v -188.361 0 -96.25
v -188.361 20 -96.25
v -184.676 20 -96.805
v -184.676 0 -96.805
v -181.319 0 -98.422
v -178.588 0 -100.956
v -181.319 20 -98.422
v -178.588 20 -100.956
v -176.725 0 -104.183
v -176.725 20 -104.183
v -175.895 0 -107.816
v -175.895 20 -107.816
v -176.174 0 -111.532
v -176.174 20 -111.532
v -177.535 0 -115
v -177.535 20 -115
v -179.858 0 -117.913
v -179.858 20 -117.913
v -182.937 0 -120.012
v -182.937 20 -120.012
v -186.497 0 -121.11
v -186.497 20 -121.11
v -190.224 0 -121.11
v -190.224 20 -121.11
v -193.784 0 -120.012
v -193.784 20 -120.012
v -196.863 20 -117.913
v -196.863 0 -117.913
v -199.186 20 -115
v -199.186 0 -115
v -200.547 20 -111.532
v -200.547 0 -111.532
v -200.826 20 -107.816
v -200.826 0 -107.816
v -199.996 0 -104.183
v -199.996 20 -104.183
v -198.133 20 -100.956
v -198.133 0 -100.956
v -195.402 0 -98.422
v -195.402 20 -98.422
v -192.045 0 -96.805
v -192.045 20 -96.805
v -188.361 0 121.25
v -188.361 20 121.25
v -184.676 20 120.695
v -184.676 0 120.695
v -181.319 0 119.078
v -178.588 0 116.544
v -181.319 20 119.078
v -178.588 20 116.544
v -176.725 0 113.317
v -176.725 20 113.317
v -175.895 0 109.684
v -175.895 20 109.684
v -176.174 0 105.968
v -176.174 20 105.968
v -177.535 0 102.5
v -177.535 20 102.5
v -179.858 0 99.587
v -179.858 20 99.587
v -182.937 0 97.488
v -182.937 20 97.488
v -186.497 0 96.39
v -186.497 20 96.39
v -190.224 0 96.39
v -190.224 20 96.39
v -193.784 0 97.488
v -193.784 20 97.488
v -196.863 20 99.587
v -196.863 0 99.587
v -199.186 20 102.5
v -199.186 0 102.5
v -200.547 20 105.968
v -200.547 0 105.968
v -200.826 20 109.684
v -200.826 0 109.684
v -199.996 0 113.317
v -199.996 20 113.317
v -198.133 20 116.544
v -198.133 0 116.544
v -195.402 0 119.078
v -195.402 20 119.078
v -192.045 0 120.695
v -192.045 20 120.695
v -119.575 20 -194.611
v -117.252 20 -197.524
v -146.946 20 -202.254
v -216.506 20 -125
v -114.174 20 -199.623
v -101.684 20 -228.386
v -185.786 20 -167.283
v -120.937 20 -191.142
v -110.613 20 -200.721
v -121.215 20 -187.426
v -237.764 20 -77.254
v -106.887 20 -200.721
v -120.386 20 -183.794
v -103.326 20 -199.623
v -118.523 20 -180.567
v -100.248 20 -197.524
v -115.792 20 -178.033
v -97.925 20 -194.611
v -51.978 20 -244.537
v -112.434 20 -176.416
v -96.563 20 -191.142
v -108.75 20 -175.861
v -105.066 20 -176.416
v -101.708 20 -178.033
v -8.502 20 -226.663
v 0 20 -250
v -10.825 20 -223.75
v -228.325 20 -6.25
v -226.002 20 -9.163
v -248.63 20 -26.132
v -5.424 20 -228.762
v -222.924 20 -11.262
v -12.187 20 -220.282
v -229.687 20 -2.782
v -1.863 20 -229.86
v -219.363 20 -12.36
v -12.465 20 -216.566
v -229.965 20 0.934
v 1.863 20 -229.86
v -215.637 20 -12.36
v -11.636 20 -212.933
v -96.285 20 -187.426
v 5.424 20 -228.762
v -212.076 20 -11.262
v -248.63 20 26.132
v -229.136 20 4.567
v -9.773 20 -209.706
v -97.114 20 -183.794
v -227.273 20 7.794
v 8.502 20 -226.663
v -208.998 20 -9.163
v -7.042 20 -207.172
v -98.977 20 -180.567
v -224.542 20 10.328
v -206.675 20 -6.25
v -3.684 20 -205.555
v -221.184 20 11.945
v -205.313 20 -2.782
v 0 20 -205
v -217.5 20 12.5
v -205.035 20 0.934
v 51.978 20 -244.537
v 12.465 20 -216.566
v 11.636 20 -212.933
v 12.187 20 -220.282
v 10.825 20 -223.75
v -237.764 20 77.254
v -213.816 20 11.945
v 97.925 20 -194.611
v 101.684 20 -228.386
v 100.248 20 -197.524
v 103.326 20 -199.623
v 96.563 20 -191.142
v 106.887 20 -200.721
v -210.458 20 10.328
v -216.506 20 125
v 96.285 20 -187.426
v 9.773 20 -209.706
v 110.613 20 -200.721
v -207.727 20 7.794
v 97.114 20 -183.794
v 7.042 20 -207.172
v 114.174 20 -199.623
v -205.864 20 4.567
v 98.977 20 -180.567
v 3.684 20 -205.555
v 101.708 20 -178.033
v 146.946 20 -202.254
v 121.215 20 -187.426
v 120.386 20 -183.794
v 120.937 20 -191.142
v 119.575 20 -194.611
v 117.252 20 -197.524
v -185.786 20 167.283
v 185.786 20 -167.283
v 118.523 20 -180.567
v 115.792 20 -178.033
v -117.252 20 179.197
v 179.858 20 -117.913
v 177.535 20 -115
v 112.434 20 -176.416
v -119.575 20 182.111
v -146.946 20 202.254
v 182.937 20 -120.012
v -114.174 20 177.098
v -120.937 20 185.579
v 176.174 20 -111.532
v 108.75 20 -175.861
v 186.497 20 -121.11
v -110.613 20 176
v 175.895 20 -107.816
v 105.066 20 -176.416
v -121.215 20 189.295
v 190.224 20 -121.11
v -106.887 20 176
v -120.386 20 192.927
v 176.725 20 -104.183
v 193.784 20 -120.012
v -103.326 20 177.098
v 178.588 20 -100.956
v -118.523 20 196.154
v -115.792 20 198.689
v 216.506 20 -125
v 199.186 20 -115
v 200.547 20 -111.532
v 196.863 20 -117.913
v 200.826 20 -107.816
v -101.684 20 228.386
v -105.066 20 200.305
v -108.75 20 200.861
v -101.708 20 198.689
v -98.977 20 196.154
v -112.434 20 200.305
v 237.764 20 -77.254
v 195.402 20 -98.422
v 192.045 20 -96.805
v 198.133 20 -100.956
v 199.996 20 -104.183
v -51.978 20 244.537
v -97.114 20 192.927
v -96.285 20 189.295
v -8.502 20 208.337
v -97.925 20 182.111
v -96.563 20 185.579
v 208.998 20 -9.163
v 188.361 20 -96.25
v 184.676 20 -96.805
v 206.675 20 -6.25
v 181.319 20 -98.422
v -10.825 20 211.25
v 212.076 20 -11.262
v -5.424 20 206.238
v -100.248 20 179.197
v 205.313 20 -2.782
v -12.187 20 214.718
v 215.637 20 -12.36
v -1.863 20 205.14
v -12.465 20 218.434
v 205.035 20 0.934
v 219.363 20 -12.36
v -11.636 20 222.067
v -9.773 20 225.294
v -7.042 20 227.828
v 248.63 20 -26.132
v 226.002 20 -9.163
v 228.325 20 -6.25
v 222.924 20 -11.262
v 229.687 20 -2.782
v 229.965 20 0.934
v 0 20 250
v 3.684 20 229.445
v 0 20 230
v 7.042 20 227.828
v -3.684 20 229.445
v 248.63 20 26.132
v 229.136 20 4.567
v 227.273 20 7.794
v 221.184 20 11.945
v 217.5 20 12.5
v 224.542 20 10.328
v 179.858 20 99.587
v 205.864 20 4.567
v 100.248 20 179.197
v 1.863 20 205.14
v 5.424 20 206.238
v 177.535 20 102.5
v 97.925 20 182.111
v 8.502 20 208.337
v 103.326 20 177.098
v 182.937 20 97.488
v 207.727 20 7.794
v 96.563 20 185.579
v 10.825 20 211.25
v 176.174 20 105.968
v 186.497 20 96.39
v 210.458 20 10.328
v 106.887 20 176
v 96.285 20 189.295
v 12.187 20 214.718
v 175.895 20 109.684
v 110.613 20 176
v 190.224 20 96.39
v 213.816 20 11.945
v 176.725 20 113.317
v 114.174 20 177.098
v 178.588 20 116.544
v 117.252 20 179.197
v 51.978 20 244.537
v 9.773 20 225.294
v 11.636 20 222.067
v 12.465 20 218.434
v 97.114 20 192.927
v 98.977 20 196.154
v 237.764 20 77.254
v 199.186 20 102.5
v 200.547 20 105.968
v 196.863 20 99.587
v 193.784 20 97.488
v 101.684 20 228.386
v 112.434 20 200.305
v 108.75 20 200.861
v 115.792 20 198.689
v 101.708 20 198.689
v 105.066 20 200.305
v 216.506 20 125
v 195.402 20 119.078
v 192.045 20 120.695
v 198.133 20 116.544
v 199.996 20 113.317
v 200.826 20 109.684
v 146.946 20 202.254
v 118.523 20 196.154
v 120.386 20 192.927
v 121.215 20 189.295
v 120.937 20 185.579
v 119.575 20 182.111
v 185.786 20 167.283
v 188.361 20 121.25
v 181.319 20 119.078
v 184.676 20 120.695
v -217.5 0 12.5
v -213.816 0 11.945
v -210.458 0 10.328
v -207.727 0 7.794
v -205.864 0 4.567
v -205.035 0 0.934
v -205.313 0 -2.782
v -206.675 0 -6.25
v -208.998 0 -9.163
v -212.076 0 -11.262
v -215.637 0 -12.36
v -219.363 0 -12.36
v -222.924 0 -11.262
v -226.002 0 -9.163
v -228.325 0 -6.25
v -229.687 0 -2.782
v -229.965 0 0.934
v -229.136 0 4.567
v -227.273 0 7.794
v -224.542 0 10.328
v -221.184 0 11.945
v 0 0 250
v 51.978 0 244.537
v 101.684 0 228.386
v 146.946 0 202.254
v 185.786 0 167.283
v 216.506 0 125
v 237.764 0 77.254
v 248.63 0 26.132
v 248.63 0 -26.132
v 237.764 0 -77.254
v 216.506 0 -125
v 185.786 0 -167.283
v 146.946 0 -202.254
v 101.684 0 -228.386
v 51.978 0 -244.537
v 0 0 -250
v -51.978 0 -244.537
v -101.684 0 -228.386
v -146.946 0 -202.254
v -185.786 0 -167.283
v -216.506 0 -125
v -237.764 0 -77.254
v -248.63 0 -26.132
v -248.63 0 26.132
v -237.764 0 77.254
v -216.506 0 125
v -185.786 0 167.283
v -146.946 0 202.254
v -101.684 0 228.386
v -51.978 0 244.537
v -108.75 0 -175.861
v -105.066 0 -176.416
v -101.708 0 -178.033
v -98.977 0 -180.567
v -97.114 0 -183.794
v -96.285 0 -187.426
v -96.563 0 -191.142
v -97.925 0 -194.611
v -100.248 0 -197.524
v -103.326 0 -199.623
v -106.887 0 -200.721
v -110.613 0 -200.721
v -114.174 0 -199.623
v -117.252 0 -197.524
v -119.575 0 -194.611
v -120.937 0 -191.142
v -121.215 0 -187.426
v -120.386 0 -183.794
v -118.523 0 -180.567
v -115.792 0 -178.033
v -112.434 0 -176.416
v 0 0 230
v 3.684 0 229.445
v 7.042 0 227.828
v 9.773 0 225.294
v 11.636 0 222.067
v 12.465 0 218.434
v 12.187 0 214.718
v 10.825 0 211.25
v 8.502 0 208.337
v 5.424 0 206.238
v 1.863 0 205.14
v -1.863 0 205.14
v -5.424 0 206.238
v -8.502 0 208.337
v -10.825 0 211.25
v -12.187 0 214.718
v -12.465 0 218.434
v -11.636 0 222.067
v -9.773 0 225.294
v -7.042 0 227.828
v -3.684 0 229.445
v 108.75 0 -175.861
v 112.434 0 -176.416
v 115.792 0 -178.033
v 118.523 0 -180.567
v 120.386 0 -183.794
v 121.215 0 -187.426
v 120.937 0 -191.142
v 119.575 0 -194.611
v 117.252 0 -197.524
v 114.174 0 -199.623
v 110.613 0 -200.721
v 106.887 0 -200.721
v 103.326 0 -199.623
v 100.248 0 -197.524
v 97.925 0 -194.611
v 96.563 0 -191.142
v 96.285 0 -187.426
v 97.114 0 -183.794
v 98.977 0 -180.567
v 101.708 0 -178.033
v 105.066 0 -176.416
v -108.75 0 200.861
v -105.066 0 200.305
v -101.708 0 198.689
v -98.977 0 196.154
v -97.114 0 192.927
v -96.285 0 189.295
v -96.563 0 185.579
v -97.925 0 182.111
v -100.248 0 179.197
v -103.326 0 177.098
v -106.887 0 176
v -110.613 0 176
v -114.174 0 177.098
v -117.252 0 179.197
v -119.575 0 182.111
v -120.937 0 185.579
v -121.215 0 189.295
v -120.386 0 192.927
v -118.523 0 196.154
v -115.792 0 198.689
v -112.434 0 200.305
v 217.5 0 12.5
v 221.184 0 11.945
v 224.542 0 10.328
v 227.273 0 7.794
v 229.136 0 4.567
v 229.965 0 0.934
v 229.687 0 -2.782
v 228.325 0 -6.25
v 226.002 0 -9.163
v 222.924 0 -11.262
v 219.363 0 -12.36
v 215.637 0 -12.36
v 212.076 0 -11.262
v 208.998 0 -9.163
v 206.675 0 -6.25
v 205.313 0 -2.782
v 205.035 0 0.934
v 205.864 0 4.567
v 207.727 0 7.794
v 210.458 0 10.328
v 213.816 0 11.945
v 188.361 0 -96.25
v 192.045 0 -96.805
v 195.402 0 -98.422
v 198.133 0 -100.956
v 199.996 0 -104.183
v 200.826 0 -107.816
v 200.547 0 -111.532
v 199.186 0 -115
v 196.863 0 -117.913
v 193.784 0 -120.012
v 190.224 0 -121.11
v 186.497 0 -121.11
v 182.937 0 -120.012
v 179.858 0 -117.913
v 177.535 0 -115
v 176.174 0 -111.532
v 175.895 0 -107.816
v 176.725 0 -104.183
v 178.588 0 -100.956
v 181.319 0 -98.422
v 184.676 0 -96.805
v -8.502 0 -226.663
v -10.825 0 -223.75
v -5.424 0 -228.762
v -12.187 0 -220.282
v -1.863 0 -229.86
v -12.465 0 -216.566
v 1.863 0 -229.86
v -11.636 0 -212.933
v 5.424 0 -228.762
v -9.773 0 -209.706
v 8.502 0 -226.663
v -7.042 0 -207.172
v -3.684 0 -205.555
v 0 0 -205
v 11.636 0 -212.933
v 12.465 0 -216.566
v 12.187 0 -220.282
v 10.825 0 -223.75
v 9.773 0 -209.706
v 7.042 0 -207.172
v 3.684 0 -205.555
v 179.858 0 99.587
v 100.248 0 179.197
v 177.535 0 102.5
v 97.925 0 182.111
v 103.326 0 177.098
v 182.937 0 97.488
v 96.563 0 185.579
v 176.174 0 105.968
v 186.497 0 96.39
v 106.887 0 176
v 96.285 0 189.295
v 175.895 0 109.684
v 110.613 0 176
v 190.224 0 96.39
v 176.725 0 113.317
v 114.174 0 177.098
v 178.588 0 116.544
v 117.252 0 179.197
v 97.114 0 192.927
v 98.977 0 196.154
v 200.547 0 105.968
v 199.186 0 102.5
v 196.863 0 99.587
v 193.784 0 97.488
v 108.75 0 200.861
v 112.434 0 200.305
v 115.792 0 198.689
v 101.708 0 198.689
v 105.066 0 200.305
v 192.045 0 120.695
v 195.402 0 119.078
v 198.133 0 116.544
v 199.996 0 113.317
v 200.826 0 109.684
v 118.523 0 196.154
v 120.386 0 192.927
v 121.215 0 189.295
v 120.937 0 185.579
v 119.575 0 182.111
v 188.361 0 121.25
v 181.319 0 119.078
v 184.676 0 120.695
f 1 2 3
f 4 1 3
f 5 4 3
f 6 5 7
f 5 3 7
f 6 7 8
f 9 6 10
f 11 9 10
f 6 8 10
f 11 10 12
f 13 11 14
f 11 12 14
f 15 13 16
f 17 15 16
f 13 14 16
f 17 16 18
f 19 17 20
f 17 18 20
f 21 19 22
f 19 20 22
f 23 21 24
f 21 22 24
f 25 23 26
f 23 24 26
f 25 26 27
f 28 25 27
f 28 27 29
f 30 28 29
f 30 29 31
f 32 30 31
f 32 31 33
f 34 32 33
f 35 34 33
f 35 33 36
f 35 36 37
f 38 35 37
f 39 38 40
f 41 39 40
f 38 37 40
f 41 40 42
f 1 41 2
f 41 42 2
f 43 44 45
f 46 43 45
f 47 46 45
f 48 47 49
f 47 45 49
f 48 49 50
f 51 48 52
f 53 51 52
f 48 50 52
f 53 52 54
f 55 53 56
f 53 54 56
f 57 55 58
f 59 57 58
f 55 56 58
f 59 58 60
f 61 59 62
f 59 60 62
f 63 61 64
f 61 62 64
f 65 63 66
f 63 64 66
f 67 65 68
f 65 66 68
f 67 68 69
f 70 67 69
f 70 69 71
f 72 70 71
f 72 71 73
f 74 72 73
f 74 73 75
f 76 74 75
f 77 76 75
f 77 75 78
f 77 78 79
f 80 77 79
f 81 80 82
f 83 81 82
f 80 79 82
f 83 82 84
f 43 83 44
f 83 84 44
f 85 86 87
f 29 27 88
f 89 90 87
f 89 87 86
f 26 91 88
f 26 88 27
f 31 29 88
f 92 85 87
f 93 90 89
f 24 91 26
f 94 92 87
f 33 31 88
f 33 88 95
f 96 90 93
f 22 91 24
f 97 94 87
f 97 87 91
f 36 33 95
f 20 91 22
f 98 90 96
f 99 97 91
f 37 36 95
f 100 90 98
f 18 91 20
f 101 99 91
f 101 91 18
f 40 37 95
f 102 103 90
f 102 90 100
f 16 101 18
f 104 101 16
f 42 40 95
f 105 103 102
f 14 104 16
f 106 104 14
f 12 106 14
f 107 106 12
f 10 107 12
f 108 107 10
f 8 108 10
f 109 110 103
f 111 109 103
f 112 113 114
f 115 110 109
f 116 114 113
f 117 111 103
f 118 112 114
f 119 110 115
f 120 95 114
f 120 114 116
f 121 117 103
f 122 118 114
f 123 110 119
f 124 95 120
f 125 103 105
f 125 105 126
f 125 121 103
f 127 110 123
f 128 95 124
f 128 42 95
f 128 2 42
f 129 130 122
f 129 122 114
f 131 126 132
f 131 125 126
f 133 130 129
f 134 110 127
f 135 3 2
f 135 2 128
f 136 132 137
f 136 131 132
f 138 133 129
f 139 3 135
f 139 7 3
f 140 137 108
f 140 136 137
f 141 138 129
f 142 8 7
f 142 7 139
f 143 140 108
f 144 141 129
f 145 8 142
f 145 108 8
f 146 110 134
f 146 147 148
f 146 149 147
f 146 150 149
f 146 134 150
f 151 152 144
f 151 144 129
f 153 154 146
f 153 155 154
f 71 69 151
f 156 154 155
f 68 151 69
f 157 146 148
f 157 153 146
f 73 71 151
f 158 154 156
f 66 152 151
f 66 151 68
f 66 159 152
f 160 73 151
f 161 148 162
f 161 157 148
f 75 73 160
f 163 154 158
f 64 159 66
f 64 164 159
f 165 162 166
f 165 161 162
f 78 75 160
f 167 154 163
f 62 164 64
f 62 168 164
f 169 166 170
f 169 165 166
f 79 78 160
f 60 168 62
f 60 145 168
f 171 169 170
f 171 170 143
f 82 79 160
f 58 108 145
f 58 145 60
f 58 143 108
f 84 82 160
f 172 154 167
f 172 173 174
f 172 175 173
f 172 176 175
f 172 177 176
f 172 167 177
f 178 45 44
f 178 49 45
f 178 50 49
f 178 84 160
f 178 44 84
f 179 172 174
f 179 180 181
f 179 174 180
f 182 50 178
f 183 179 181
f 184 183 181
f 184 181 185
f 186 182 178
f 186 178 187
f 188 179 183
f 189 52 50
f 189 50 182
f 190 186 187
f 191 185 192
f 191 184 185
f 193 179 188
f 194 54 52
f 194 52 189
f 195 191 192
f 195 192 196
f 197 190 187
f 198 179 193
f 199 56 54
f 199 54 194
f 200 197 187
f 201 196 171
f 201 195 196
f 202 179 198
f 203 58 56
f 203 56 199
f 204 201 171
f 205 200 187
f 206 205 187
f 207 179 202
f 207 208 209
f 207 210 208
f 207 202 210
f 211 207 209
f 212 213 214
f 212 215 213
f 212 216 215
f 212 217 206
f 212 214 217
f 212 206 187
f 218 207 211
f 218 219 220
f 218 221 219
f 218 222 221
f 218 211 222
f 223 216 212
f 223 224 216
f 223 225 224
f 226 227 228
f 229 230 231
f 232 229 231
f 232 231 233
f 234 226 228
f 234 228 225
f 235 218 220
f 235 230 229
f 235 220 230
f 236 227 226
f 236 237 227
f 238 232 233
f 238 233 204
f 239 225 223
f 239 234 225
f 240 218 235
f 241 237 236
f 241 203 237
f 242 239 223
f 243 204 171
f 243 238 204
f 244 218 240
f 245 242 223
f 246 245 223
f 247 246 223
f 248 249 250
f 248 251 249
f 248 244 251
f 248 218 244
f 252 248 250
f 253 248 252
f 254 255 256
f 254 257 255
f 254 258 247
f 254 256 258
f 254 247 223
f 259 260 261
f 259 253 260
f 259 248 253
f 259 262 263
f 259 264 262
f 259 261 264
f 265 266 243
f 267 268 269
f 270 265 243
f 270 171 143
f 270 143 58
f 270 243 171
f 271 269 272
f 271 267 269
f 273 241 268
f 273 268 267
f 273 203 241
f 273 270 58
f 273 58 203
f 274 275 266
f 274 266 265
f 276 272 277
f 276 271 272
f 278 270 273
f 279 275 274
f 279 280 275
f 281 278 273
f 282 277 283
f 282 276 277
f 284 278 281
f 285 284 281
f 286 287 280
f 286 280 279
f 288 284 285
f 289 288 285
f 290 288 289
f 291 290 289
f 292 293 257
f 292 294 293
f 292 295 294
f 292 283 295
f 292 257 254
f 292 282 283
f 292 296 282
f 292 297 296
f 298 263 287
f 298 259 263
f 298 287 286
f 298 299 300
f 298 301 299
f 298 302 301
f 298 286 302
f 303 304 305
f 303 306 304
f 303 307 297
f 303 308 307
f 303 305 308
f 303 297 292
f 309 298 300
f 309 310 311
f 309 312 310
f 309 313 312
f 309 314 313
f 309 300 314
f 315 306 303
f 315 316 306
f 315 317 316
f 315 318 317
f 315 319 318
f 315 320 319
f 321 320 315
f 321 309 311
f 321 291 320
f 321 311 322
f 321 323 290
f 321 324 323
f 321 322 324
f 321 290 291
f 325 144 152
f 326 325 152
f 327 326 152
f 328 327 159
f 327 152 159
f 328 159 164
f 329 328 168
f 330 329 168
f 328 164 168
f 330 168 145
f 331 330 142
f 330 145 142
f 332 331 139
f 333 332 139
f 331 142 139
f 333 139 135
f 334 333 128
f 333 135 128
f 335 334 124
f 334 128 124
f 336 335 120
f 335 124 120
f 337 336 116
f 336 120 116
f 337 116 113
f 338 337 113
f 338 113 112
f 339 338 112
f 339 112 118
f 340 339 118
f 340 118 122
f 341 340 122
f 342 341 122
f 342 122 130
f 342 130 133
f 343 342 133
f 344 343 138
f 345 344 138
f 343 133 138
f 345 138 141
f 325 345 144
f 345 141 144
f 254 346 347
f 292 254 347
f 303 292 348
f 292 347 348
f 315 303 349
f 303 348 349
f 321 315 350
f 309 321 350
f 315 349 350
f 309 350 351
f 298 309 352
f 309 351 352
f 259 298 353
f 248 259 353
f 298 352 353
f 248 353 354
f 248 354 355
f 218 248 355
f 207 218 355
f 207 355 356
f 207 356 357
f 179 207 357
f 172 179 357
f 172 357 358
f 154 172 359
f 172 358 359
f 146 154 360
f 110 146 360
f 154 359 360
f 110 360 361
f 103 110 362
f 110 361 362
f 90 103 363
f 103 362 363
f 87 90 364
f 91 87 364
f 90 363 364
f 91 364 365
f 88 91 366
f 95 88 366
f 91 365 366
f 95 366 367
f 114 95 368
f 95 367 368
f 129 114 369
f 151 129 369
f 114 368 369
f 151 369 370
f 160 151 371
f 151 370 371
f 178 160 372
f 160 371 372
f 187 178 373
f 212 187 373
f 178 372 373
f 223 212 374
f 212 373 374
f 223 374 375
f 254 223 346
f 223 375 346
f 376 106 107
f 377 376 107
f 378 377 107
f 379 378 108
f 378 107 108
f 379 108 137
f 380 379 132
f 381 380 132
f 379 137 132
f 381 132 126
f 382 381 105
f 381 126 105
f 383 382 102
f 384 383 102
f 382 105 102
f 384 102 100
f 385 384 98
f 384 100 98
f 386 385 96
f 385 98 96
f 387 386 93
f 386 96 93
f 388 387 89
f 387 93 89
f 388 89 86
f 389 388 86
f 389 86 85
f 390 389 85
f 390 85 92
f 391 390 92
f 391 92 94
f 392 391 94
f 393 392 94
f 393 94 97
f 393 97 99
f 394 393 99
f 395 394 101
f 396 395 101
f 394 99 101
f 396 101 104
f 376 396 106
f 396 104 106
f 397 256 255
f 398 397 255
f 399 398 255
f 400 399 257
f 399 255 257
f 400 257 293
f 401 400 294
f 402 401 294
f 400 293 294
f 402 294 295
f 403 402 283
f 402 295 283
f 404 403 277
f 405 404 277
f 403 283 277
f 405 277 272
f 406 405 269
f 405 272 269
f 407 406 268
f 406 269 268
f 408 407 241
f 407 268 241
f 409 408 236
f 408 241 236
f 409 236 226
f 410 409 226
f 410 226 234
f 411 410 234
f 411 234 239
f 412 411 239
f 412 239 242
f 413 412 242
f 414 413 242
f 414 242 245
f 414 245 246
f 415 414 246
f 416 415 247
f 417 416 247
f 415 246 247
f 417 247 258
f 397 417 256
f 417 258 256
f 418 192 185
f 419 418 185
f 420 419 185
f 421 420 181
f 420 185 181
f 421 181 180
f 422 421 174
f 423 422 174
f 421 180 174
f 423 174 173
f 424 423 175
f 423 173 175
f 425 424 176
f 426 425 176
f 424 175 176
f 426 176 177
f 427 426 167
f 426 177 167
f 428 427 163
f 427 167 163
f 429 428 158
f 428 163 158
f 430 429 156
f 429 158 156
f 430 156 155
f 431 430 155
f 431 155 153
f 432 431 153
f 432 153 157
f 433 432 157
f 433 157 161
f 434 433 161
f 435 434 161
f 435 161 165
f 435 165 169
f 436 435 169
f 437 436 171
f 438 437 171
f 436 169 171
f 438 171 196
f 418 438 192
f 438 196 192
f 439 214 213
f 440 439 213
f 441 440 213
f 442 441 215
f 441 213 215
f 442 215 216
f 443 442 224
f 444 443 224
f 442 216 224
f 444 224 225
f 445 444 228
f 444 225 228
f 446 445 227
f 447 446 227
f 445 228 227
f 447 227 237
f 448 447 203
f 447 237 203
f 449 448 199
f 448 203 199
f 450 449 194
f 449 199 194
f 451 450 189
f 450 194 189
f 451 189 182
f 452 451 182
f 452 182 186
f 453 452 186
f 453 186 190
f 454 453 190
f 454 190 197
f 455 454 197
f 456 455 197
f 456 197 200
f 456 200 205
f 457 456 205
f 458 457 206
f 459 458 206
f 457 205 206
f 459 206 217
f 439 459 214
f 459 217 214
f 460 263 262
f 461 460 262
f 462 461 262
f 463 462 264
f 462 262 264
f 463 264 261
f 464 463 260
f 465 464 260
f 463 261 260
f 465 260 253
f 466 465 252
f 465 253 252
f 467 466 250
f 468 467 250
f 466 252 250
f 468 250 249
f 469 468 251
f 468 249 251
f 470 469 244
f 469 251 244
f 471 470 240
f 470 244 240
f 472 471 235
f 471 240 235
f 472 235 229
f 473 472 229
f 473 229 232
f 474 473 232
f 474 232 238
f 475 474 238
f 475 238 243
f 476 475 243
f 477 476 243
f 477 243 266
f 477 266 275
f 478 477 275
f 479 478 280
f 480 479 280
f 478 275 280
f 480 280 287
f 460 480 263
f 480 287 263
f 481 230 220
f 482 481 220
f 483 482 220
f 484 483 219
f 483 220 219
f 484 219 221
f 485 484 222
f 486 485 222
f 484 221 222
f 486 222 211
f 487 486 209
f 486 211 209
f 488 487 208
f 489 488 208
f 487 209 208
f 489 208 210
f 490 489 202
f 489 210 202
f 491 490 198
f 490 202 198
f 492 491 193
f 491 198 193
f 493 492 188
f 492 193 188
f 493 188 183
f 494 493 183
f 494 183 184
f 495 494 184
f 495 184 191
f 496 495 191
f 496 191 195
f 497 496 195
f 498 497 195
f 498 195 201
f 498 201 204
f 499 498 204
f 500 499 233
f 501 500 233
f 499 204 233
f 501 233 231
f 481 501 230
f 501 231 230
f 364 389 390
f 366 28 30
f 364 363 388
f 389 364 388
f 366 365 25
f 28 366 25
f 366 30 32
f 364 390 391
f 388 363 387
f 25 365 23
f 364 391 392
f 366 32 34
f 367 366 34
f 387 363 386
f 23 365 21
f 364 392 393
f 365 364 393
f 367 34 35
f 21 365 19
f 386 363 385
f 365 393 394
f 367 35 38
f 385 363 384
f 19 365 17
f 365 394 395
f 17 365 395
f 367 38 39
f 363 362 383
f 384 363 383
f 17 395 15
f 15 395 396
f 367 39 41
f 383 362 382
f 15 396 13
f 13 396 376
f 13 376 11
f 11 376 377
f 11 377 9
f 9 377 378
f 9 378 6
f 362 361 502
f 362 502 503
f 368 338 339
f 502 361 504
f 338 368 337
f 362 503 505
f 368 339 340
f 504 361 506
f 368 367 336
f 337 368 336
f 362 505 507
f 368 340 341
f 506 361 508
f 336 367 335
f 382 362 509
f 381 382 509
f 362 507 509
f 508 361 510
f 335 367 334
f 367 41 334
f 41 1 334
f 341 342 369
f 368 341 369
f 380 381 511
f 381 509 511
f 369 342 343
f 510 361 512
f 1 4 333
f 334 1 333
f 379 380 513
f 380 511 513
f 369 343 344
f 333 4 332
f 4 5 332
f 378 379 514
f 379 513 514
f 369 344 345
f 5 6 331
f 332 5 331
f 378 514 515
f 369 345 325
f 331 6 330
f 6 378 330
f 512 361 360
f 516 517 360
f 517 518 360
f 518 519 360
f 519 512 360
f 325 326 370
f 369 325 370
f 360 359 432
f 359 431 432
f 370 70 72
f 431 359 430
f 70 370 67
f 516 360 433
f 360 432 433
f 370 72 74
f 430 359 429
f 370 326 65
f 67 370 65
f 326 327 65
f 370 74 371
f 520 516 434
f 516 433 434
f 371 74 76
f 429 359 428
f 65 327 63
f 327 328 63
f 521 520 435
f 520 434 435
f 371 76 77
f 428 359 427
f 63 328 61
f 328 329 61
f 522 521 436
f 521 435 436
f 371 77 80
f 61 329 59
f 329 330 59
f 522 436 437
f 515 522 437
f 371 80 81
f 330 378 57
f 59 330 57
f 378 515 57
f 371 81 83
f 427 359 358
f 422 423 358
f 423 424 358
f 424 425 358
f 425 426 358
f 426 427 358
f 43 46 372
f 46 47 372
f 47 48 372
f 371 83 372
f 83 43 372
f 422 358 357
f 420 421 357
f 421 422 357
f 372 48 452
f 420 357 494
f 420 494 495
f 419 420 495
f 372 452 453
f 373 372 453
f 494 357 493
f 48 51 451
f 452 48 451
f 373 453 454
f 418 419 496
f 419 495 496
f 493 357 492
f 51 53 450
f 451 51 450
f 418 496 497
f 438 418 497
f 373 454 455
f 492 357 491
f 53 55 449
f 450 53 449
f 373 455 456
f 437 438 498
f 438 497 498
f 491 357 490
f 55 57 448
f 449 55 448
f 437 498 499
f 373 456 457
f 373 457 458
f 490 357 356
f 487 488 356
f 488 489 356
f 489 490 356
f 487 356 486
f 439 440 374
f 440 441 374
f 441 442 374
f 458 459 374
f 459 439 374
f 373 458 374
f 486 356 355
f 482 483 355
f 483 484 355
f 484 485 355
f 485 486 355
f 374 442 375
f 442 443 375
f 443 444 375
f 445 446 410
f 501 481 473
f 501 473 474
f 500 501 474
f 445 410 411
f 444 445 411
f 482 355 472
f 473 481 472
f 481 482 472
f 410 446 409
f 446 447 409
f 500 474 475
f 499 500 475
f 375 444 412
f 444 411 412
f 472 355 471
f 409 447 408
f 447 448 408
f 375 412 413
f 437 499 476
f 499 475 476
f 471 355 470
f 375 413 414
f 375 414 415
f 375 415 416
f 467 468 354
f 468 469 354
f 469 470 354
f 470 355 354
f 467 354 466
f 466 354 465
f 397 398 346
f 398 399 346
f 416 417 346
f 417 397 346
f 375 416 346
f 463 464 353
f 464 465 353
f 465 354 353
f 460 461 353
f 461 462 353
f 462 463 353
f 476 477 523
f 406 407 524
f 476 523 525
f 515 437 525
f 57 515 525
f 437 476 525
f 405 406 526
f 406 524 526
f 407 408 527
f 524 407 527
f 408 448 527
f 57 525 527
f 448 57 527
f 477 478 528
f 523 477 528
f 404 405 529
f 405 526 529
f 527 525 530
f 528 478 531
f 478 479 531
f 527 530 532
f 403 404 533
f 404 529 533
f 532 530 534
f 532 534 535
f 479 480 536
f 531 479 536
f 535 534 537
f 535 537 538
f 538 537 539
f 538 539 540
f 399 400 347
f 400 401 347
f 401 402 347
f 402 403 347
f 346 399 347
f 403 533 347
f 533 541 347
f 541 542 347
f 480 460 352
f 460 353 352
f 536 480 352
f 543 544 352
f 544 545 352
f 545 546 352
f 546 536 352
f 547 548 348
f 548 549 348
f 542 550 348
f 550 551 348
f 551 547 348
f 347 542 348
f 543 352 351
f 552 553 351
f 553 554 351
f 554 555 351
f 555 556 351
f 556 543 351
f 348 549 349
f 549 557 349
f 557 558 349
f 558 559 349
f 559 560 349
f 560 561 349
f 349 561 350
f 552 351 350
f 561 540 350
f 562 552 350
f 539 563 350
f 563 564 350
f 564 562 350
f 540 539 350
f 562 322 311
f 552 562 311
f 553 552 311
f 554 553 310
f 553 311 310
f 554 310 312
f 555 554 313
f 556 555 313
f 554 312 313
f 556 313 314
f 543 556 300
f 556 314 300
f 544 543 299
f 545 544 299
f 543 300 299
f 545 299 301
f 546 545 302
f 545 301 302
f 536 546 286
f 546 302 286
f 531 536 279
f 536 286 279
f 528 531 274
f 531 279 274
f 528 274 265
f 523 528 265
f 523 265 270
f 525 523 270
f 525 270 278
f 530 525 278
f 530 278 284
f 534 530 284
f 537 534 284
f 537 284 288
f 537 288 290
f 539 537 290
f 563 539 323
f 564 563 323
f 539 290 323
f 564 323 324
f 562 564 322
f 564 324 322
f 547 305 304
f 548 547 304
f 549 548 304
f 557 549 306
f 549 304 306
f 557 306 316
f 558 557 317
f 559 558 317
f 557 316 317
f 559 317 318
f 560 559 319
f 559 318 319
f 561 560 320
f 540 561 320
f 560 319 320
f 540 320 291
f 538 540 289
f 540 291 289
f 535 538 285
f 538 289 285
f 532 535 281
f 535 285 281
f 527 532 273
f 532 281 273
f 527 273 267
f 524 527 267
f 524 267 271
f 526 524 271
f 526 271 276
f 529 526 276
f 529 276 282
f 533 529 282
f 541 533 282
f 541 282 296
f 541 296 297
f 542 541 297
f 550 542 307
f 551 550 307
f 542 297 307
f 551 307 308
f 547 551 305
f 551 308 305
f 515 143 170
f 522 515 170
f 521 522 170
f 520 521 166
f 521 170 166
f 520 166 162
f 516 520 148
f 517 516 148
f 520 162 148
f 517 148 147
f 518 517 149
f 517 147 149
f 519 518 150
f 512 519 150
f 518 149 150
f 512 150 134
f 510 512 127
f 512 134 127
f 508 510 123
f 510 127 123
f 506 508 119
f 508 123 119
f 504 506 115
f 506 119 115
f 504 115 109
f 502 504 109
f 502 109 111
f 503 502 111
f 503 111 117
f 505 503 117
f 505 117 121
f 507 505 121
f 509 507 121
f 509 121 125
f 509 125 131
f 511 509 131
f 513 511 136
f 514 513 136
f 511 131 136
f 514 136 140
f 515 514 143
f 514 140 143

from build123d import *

# Parameters (mm, degrees)
SKETCH1_R           = 250
BOSS_EXTRUDE1_DEPTH = 20
SKETCH2_R           = 12.5
CUT_EXTRUDE1_DEPTH  = 20


with BuildPart() as part:
    # Sketch1 → Boss-Extrude1 (new body)
    with BuildSketch(Plane(origin=(0, 0, 0), x_dir=(1, 0, 0), z_dir=(0, 1, 0))):
        with Locations(Location((0, 0, 0), (0, 0, 270))):
            Circle(SKETCH1_R)
    extrude(amount=BOSS_EXTRUDE1_DEPTH)

    # Sketch2 → Cut-Extrude1 (cut)
    with BuildSketch(Plane(origin=(0, 20, 0), x_dir=(1, 0, 0), z_dir=(0, 1, 0))):
        with Locations(Location((0, 217.5, 0), (0, 0, 270))):
            Circle(SKETCH2_R)
        with Locations(Location((108.75, 188.360525323, 0), (0, 0, 270))):
            Circle(SKETCH2_R)
        with Locations(Location((188.360525323, 108.75, 0), (0, 0, 270))):
            Circle(SKETCH2_R)
        with Locations(Location((217.5, 0, 0), (0, 0, 270))):
            Circle(SKETCH2_R)
        with Locations(Location((188.360525323, -108.75, 0), (0, 0, 270))):
            Circle(SKETCH2_R)
        with Locations(Location((108.75, -188.360525323, 0), (0, 0, 270))):
            Circle(SKETCH2_R)
        with Locations(Location((0, -217.5, 0), (0, 0, 270))):
            Circle(SKETCH2_R)
        with Locations(Location((-108.75, -188.360525323, 0), (0, 0, 270))):
            Circle(SKETCH2_R)
        with Locations(Location((-188.360525323, -108.75, 0), (0, 0, 270))):
            Circle(SKETCH2_R)
        with Locations(Location((-217.5, 0, 0), (0, 0, 270))):
            Circle(SKETCH2_R)
        with Locations(Location((-188.360525323, 108.75, 0), (0, 0, 270))):
            Circle(SKETCH2_R)
        with Locations(Location((-108.75, 188.360525323, 0), (0, 0, 270))):
            Circle(SKETCH2_R)
    extrude(amount=-CUT_EXTRUDE1_DEPTH, mode=Mode.SUBTRACT)


solid = part.part
